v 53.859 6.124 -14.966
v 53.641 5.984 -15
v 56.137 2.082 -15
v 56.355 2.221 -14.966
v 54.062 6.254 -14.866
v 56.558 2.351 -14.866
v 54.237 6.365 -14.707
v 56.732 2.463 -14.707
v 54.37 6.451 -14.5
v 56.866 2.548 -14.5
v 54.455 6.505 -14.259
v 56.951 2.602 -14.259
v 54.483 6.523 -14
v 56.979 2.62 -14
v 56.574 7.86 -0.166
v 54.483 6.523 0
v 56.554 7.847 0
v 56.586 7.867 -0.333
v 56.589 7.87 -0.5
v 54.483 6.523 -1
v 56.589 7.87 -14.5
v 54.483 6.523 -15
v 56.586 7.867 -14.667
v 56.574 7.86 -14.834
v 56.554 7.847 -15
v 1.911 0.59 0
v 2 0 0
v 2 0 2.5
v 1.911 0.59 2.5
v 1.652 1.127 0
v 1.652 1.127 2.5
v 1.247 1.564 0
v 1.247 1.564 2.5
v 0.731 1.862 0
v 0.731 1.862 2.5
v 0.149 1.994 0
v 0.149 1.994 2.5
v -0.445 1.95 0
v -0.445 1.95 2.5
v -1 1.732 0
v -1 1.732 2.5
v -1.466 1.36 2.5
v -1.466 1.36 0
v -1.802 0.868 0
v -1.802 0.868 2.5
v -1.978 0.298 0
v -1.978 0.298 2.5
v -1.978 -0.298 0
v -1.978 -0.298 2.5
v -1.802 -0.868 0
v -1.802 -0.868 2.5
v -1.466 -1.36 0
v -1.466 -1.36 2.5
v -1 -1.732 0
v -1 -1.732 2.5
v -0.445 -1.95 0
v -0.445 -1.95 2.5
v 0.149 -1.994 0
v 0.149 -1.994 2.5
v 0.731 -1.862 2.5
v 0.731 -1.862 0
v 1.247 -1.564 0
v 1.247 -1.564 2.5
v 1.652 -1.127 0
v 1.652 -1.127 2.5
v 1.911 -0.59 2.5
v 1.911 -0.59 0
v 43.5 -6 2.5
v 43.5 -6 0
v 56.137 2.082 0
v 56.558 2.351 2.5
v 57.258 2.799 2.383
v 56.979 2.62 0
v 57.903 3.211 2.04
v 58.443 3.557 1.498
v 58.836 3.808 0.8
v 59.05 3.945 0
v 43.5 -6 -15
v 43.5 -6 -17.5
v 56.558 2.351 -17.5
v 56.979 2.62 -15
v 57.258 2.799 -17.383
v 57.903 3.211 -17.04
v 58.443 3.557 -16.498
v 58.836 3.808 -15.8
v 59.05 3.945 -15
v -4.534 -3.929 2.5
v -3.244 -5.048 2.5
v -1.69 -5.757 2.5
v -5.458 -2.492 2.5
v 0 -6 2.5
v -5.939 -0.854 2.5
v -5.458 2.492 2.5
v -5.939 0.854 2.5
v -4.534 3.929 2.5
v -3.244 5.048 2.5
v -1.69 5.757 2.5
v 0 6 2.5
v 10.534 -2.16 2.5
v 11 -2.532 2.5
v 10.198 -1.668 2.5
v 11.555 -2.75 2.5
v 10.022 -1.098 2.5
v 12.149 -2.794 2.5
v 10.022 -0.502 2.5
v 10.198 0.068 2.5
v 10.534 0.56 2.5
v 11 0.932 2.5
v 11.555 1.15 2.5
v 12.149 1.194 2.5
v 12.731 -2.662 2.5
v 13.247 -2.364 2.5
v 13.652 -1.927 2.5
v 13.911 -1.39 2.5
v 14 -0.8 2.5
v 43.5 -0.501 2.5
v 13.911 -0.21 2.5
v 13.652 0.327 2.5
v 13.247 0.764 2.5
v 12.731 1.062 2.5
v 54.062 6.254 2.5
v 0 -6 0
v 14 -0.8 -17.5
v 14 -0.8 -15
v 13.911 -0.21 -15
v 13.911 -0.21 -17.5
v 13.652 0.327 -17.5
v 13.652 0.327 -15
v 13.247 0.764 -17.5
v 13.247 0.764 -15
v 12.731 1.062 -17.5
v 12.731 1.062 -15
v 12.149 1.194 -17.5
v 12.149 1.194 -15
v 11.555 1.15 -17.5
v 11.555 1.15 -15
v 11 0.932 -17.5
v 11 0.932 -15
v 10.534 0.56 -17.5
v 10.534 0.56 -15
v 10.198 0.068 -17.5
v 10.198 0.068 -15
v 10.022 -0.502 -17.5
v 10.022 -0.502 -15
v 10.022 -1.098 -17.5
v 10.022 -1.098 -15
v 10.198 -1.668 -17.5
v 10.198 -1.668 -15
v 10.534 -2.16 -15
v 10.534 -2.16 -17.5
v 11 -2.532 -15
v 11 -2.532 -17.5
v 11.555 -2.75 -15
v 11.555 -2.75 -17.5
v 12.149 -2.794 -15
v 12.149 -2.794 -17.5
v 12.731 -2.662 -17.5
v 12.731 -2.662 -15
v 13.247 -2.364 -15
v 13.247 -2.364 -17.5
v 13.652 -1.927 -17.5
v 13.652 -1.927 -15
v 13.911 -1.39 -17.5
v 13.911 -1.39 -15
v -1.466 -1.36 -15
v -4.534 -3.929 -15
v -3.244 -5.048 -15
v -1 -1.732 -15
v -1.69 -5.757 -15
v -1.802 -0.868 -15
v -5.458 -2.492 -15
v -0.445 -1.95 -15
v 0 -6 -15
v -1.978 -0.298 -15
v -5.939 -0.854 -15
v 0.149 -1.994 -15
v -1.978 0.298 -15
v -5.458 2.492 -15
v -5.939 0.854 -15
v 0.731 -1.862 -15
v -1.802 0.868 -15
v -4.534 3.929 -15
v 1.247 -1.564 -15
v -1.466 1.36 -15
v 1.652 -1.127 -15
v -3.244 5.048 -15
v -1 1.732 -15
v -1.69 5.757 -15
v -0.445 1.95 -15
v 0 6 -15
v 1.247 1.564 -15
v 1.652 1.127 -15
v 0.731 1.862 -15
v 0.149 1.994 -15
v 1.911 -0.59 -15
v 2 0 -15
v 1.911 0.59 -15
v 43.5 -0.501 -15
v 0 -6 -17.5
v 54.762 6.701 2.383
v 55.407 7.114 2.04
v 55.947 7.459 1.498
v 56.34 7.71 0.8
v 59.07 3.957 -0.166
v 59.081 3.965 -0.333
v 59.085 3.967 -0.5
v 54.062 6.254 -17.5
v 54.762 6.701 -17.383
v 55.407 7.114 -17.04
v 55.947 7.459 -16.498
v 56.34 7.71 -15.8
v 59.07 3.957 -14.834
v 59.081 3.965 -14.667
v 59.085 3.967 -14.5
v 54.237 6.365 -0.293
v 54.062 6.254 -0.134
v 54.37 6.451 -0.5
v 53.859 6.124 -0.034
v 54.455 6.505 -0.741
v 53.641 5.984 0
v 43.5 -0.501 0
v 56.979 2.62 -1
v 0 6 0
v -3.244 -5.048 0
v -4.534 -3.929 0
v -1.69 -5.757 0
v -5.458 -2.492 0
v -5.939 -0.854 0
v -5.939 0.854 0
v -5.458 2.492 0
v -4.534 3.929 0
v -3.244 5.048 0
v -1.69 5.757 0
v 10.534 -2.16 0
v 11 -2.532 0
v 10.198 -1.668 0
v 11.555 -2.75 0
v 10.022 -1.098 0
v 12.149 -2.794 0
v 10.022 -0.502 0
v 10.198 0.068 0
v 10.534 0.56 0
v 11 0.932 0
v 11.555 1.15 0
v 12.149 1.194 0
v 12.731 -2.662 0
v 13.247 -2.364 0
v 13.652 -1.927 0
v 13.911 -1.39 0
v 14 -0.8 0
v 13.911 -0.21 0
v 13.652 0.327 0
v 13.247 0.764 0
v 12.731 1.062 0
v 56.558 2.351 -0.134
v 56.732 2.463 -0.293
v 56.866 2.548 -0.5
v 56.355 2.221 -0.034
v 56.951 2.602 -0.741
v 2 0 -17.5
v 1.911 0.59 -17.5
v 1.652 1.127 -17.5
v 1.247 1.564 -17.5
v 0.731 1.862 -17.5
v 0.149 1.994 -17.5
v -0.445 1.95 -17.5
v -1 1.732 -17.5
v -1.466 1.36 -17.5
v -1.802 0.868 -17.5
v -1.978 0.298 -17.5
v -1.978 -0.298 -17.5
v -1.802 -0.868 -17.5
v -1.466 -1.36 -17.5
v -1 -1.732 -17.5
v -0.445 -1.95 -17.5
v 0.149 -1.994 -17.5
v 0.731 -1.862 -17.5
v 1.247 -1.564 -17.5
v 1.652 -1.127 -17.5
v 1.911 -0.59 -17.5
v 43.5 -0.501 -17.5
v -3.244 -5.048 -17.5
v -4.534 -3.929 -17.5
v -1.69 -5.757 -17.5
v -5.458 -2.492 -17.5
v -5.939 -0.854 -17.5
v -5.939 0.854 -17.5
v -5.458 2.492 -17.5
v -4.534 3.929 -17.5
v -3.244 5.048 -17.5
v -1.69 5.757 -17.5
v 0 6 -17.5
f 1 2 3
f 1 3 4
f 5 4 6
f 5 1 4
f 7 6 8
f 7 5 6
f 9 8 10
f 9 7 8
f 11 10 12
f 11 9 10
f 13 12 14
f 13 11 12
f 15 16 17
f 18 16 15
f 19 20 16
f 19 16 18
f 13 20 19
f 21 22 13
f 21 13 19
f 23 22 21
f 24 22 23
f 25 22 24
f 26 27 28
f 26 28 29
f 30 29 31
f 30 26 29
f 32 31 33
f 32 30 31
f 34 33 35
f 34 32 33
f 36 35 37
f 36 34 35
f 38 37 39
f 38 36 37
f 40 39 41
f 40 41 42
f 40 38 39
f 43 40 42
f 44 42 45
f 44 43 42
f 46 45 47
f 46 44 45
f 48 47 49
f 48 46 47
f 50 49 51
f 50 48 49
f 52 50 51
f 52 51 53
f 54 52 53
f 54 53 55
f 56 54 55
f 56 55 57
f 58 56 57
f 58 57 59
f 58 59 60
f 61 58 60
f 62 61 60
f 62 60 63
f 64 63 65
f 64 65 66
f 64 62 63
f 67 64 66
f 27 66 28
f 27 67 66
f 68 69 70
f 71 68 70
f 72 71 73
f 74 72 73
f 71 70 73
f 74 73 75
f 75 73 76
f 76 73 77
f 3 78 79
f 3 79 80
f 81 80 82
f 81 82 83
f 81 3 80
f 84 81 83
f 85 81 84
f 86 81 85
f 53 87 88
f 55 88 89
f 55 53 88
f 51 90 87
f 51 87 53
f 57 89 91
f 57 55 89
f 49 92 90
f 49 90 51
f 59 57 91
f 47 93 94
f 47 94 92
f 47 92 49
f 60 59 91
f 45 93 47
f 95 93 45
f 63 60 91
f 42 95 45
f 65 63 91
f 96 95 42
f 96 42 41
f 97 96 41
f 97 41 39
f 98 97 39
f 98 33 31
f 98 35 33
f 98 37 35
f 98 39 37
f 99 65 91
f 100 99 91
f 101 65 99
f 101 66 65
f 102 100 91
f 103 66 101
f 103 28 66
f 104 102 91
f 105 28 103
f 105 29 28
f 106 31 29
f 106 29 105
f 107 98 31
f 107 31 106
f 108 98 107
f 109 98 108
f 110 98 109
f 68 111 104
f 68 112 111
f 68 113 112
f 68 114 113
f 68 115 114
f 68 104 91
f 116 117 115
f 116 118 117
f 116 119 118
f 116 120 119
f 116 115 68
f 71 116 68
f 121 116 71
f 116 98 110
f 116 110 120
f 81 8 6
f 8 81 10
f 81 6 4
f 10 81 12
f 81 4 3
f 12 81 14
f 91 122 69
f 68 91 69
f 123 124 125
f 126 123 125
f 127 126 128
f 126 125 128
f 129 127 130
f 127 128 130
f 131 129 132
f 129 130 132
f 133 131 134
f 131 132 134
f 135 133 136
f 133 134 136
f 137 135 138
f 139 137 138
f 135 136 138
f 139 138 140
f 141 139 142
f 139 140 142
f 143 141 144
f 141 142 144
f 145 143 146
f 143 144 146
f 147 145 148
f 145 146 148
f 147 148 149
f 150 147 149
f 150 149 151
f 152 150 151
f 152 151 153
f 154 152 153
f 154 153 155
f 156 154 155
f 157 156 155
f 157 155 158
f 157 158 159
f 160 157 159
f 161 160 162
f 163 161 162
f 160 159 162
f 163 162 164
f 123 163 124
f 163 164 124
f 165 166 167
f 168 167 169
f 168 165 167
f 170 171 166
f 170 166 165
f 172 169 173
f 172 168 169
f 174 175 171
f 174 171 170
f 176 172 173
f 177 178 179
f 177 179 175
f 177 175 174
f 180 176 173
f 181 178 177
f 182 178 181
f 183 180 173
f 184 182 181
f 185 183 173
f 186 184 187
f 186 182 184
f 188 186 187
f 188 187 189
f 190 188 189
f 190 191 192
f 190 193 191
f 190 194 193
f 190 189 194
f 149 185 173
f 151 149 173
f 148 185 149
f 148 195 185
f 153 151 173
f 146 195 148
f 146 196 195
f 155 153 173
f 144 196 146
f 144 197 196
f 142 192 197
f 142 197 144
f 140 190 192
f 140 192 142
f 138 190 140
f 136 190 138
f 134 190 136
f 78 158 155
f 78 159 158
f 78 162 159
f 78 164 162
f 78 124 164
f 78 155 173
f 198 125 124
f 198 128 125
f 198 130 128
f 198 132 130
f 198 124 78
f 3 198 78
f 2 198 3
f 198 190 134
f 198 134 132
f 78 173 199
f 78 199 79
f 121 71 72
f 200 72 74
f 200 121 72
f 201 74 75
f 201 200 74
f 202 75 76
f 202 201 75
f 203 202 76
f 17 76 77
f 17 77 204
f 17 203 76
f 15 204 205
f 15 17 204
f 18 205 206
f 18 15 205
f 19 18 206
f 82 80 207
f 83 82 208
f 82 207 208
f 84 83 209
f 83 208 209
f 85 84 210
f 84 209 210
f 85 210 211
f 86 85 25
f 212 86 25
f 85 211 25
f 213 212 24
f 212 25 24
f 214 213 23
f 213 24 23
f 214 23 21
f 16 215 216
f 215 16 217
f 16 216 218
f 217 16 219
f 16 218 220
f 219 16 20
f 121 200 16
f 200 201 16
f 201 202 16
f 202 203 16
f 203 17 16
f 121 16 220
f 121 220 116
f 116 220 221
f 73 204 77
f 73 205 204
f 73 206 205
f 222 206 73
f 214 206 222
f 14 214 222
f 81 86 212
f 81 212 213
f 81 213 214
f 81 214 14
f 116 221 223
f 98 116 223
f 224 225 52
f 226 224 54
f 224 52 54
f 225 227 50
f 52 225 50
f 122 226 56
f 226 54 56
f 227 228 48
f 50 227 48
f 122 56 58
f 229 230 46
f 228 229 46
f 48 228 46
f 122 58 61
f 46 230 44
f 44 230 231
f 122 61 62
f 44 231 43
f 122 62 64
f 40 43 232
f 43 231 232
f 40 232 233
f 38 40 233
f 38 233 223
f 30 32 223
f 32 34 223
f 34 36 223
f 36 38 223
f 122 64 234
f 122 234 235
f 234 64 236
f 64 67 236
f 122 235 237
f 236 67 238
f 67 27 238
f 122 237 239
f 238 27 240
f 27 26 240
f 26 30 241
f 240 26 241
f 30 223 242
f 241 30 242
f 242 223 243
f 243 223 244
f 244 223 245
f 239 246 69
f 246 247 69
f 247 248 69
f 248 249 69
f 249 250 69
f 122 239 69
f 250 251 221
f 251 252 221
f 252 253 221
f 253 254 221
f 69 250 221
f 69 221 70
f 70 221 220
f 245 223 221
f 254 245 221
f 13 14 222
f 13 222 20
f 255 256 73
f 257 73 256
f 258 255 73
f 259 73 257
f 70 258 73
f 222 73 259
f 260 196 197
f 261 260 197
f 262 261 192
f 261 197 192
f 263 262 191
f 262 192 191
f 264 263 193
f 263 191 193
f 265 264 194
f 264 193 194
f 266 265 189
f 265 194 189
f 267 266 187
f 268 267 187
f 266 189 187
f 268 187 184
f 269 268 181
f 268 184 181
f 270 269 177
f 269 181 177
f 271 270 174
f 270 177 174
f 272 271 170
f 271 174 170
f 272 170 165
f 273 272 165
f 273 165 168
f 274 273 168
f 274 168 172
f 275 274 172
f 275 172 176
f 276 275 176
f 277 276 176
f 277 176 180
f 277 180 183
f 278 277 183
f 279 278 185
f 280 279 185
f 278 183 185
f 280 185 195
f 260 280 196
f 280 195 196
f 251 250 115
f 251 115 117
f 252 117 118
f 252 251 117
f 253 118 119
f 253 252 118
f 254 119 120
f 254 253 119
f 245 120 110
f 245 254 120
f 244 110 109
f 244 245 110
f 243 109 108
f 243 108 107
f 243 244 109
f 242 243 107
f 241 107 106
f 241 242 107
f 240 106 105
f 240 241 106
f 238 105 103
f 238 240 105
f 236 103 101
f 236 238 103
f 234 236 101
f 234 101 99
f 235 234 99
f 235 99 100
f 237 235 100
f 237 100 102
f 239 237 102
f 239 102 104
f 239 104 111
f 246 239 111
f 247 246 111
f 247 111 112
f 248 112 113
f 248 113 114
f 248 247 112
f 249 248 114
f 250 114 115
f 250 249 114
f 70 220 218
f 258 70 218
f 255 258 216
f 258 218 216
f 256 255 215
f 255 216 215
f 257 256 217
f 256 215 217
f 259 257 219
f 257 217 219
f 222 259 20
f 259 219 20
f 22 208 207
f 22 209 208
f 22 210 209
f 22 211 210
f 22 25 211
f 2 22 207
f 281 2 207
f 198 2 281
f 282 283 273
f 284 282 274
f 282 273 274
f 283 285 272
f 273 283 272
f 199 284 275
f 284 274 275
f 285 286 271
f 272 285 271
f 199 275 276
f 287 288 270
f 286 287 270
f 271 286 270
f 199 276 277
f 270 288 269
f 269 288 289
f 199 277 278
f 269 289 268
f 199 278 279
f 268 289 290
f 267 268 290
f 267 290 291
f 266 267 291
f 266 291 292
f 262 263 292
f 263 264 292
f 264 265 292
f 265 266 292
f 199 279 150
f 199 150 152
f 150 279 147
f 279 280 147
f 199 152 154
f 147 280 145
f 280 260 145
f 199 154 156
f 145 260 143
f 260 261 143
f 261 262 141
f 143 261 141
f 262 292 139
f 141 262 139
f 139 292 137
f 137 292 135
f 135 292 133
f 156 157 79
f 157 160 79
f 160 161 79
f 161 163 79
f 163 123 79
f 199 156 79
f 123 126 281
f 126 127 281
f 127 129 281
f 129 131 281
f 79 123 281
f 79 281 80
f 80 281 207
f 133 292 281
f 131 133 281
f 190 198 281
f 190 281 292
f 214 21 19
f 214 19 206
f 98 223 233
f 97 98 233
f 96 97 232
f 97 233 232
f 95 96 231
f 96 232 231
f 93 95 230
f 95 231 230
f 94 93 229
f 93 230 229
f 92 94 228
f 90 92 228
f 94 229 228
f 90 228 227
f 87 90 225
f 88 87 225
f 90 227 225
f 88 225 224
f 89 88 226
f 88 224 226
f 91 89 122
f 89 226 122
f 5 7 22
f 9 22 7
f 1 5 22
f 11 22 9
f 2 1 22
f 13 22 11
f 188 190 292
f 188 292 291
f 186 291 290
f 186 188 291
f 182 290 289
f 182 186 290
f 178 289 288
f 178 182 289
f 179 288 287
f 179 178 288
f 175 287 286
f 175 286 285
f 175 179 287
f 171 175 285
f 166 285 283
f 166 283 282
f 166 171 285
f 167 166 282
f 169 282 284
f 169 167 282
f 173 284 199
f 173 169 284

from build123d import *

# Parameters (mm, degrees)
SCHIZZO1_R                   = 2
ESTRUSIONE_ESTRUSIONE1_DEPTH = 2.5
ESTRUSIONE_ESTRUSIONE2_DEPTH = 7.5
TAGLIO_ESTRUSIONE1_DEPTH     = 55.551477823
ESTRUSIONE_ESTRUSIONE3_DEPTH = 4.632546


with BuildPart() as part:
    # Schizzo1 → Estrusione-Estrusione1 (new body)
    with BuildSketch(Plane.XY):
        with BuildLine():
            Line((0, -6), (43.5, -6))
            Line((43.5, -6), (59.085369345, 3.967259523))
            Line((59.085369345, 3.967259523), (56.58948898, 7.869958879))
            Line((56.58948898, 7.869958879), (43.5, -0.501118559))
            Line((43.5, -0.501118559), (0, 6))
            ThreePointArc((0, 6), (-6, 0), (0, -6))
        make_face()
        Circle(SCHIZZO1_R, mode=Mode.SUBTRACT)
        with Locations((12, -0.8)):
            Circle(SCHIZZO1_R, mode=Mode.SUBTRACT)
    extrude(amount=ESTRUSIONE_ESTRUSIONE1_DEPTH)

    # Schizzo3 → Estrusione-Estrusione2 (add)
    with BuildSketch(Plane(origin=(0, 0, 0), x_dir=(-1, 0, 0), z_dir=(0, 0, -1))):
        Polygon((-56.58948898, 7.869958879), (-59.085369345, 3.967259523), (-56.979238352, 2.62033256), (-54.483357987, 6.523031917), align=None)
    extrude(amount=ESTRUSIONE_ESTRUSIONE2_DEPTH)

    # Schizzo4 → Taglio-Estrusione1 (cut, through all)
    with BuildSketch(Plane(origin=(12.854369278, -20.099817049, 0), x_dir=(0.8424523970071469, 0.5387707850068642, 0), z_dir=(-0.5387707850068642, 0.8424523970071469, 0))):
        with BuildLine():
            Line((51.91405456, 0.5), (51.91405456, -2.5))
            Line((51.91405456, -2.5), (48.91405456, -2.5))
            ThreePointArc((48.91405456, -2.5), (51.035374903, -1.621320344), (51.91405456, 0.5))
        make_face()
    extrude(amount=-TAGLIO_ESTRUSIONE1_DEPTH, mode=Mode.SUBTRACT)

    # Schizzo5 → Estrusione-Estrusione3 (add)
    with BuildSketch(Plane(origin=(12.854369278, -20.099817049, 0), x_dir=(0.8424523970071469, 0.5387707850068642, 0), z_dir=(-0.5387707850068642, 0.8424523970071469, 0))):
        with BuildLine():
            Line((49.41405456, 1), (49.41405456, 0))
            Line((49.41405456, 0), (48.41405456, 0))
            ThreePointArc((48.41405456, 0), (49.121161341, 0.292893219), (49.41405456, 1))
        make_face()
    extrude(amount=-ESTRUSIONE_ESTRUSIONE3_DEPTH)

    # Specchia4: part across plane


with BuildPart() as part_1:
    add(part.part)
    add(part.part.mirror(Plane.XY.offset(-7.5)))


solid = part_1.part
